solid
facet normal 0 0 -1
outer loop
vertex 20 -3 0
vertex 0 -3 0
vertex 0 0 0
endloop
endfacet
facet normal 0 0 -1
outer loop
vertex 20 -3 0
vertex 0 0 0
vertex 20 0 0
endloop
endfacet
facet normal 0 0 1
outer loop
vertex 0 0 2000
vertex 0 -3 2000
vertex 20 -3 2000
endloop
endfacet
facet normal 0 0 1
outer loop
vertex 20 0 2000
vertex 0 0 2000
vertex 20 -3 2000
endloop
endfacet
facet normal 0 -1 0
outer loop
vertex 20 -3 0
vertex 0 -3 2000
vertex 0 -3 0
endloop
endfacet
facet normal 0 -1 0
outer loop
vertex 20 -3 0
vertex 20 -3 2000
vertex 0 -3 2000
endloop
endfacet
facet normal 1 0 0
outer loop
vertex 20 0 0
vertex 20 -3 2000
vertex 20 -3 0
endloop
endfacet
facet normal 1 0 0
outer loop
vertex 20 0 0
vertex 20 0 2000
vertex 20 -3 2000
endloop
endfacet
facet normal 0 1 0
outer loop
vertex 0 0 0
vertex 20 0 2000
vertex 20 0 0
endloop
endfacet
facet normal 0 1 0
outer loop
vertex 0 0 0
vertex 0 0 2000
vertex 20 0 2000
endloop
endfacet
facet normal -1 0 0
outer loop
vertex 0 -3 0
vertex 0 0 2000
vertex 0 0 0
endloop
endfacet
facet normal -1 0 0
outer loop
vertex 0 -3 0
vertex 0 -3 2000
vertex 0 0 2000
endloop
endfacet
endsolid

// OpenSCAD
/*
 width = a
 material_thickness = b
*/

module simple_profile_flat(a,b, length) {
    echo(material="<b>flat profile</b>", a, b, length);
    translate([0,-b,0])
    linear_extrude( height = length ) {
        square([a,b]);
    }
}

simple_profile_flat(20,3, 2000);
